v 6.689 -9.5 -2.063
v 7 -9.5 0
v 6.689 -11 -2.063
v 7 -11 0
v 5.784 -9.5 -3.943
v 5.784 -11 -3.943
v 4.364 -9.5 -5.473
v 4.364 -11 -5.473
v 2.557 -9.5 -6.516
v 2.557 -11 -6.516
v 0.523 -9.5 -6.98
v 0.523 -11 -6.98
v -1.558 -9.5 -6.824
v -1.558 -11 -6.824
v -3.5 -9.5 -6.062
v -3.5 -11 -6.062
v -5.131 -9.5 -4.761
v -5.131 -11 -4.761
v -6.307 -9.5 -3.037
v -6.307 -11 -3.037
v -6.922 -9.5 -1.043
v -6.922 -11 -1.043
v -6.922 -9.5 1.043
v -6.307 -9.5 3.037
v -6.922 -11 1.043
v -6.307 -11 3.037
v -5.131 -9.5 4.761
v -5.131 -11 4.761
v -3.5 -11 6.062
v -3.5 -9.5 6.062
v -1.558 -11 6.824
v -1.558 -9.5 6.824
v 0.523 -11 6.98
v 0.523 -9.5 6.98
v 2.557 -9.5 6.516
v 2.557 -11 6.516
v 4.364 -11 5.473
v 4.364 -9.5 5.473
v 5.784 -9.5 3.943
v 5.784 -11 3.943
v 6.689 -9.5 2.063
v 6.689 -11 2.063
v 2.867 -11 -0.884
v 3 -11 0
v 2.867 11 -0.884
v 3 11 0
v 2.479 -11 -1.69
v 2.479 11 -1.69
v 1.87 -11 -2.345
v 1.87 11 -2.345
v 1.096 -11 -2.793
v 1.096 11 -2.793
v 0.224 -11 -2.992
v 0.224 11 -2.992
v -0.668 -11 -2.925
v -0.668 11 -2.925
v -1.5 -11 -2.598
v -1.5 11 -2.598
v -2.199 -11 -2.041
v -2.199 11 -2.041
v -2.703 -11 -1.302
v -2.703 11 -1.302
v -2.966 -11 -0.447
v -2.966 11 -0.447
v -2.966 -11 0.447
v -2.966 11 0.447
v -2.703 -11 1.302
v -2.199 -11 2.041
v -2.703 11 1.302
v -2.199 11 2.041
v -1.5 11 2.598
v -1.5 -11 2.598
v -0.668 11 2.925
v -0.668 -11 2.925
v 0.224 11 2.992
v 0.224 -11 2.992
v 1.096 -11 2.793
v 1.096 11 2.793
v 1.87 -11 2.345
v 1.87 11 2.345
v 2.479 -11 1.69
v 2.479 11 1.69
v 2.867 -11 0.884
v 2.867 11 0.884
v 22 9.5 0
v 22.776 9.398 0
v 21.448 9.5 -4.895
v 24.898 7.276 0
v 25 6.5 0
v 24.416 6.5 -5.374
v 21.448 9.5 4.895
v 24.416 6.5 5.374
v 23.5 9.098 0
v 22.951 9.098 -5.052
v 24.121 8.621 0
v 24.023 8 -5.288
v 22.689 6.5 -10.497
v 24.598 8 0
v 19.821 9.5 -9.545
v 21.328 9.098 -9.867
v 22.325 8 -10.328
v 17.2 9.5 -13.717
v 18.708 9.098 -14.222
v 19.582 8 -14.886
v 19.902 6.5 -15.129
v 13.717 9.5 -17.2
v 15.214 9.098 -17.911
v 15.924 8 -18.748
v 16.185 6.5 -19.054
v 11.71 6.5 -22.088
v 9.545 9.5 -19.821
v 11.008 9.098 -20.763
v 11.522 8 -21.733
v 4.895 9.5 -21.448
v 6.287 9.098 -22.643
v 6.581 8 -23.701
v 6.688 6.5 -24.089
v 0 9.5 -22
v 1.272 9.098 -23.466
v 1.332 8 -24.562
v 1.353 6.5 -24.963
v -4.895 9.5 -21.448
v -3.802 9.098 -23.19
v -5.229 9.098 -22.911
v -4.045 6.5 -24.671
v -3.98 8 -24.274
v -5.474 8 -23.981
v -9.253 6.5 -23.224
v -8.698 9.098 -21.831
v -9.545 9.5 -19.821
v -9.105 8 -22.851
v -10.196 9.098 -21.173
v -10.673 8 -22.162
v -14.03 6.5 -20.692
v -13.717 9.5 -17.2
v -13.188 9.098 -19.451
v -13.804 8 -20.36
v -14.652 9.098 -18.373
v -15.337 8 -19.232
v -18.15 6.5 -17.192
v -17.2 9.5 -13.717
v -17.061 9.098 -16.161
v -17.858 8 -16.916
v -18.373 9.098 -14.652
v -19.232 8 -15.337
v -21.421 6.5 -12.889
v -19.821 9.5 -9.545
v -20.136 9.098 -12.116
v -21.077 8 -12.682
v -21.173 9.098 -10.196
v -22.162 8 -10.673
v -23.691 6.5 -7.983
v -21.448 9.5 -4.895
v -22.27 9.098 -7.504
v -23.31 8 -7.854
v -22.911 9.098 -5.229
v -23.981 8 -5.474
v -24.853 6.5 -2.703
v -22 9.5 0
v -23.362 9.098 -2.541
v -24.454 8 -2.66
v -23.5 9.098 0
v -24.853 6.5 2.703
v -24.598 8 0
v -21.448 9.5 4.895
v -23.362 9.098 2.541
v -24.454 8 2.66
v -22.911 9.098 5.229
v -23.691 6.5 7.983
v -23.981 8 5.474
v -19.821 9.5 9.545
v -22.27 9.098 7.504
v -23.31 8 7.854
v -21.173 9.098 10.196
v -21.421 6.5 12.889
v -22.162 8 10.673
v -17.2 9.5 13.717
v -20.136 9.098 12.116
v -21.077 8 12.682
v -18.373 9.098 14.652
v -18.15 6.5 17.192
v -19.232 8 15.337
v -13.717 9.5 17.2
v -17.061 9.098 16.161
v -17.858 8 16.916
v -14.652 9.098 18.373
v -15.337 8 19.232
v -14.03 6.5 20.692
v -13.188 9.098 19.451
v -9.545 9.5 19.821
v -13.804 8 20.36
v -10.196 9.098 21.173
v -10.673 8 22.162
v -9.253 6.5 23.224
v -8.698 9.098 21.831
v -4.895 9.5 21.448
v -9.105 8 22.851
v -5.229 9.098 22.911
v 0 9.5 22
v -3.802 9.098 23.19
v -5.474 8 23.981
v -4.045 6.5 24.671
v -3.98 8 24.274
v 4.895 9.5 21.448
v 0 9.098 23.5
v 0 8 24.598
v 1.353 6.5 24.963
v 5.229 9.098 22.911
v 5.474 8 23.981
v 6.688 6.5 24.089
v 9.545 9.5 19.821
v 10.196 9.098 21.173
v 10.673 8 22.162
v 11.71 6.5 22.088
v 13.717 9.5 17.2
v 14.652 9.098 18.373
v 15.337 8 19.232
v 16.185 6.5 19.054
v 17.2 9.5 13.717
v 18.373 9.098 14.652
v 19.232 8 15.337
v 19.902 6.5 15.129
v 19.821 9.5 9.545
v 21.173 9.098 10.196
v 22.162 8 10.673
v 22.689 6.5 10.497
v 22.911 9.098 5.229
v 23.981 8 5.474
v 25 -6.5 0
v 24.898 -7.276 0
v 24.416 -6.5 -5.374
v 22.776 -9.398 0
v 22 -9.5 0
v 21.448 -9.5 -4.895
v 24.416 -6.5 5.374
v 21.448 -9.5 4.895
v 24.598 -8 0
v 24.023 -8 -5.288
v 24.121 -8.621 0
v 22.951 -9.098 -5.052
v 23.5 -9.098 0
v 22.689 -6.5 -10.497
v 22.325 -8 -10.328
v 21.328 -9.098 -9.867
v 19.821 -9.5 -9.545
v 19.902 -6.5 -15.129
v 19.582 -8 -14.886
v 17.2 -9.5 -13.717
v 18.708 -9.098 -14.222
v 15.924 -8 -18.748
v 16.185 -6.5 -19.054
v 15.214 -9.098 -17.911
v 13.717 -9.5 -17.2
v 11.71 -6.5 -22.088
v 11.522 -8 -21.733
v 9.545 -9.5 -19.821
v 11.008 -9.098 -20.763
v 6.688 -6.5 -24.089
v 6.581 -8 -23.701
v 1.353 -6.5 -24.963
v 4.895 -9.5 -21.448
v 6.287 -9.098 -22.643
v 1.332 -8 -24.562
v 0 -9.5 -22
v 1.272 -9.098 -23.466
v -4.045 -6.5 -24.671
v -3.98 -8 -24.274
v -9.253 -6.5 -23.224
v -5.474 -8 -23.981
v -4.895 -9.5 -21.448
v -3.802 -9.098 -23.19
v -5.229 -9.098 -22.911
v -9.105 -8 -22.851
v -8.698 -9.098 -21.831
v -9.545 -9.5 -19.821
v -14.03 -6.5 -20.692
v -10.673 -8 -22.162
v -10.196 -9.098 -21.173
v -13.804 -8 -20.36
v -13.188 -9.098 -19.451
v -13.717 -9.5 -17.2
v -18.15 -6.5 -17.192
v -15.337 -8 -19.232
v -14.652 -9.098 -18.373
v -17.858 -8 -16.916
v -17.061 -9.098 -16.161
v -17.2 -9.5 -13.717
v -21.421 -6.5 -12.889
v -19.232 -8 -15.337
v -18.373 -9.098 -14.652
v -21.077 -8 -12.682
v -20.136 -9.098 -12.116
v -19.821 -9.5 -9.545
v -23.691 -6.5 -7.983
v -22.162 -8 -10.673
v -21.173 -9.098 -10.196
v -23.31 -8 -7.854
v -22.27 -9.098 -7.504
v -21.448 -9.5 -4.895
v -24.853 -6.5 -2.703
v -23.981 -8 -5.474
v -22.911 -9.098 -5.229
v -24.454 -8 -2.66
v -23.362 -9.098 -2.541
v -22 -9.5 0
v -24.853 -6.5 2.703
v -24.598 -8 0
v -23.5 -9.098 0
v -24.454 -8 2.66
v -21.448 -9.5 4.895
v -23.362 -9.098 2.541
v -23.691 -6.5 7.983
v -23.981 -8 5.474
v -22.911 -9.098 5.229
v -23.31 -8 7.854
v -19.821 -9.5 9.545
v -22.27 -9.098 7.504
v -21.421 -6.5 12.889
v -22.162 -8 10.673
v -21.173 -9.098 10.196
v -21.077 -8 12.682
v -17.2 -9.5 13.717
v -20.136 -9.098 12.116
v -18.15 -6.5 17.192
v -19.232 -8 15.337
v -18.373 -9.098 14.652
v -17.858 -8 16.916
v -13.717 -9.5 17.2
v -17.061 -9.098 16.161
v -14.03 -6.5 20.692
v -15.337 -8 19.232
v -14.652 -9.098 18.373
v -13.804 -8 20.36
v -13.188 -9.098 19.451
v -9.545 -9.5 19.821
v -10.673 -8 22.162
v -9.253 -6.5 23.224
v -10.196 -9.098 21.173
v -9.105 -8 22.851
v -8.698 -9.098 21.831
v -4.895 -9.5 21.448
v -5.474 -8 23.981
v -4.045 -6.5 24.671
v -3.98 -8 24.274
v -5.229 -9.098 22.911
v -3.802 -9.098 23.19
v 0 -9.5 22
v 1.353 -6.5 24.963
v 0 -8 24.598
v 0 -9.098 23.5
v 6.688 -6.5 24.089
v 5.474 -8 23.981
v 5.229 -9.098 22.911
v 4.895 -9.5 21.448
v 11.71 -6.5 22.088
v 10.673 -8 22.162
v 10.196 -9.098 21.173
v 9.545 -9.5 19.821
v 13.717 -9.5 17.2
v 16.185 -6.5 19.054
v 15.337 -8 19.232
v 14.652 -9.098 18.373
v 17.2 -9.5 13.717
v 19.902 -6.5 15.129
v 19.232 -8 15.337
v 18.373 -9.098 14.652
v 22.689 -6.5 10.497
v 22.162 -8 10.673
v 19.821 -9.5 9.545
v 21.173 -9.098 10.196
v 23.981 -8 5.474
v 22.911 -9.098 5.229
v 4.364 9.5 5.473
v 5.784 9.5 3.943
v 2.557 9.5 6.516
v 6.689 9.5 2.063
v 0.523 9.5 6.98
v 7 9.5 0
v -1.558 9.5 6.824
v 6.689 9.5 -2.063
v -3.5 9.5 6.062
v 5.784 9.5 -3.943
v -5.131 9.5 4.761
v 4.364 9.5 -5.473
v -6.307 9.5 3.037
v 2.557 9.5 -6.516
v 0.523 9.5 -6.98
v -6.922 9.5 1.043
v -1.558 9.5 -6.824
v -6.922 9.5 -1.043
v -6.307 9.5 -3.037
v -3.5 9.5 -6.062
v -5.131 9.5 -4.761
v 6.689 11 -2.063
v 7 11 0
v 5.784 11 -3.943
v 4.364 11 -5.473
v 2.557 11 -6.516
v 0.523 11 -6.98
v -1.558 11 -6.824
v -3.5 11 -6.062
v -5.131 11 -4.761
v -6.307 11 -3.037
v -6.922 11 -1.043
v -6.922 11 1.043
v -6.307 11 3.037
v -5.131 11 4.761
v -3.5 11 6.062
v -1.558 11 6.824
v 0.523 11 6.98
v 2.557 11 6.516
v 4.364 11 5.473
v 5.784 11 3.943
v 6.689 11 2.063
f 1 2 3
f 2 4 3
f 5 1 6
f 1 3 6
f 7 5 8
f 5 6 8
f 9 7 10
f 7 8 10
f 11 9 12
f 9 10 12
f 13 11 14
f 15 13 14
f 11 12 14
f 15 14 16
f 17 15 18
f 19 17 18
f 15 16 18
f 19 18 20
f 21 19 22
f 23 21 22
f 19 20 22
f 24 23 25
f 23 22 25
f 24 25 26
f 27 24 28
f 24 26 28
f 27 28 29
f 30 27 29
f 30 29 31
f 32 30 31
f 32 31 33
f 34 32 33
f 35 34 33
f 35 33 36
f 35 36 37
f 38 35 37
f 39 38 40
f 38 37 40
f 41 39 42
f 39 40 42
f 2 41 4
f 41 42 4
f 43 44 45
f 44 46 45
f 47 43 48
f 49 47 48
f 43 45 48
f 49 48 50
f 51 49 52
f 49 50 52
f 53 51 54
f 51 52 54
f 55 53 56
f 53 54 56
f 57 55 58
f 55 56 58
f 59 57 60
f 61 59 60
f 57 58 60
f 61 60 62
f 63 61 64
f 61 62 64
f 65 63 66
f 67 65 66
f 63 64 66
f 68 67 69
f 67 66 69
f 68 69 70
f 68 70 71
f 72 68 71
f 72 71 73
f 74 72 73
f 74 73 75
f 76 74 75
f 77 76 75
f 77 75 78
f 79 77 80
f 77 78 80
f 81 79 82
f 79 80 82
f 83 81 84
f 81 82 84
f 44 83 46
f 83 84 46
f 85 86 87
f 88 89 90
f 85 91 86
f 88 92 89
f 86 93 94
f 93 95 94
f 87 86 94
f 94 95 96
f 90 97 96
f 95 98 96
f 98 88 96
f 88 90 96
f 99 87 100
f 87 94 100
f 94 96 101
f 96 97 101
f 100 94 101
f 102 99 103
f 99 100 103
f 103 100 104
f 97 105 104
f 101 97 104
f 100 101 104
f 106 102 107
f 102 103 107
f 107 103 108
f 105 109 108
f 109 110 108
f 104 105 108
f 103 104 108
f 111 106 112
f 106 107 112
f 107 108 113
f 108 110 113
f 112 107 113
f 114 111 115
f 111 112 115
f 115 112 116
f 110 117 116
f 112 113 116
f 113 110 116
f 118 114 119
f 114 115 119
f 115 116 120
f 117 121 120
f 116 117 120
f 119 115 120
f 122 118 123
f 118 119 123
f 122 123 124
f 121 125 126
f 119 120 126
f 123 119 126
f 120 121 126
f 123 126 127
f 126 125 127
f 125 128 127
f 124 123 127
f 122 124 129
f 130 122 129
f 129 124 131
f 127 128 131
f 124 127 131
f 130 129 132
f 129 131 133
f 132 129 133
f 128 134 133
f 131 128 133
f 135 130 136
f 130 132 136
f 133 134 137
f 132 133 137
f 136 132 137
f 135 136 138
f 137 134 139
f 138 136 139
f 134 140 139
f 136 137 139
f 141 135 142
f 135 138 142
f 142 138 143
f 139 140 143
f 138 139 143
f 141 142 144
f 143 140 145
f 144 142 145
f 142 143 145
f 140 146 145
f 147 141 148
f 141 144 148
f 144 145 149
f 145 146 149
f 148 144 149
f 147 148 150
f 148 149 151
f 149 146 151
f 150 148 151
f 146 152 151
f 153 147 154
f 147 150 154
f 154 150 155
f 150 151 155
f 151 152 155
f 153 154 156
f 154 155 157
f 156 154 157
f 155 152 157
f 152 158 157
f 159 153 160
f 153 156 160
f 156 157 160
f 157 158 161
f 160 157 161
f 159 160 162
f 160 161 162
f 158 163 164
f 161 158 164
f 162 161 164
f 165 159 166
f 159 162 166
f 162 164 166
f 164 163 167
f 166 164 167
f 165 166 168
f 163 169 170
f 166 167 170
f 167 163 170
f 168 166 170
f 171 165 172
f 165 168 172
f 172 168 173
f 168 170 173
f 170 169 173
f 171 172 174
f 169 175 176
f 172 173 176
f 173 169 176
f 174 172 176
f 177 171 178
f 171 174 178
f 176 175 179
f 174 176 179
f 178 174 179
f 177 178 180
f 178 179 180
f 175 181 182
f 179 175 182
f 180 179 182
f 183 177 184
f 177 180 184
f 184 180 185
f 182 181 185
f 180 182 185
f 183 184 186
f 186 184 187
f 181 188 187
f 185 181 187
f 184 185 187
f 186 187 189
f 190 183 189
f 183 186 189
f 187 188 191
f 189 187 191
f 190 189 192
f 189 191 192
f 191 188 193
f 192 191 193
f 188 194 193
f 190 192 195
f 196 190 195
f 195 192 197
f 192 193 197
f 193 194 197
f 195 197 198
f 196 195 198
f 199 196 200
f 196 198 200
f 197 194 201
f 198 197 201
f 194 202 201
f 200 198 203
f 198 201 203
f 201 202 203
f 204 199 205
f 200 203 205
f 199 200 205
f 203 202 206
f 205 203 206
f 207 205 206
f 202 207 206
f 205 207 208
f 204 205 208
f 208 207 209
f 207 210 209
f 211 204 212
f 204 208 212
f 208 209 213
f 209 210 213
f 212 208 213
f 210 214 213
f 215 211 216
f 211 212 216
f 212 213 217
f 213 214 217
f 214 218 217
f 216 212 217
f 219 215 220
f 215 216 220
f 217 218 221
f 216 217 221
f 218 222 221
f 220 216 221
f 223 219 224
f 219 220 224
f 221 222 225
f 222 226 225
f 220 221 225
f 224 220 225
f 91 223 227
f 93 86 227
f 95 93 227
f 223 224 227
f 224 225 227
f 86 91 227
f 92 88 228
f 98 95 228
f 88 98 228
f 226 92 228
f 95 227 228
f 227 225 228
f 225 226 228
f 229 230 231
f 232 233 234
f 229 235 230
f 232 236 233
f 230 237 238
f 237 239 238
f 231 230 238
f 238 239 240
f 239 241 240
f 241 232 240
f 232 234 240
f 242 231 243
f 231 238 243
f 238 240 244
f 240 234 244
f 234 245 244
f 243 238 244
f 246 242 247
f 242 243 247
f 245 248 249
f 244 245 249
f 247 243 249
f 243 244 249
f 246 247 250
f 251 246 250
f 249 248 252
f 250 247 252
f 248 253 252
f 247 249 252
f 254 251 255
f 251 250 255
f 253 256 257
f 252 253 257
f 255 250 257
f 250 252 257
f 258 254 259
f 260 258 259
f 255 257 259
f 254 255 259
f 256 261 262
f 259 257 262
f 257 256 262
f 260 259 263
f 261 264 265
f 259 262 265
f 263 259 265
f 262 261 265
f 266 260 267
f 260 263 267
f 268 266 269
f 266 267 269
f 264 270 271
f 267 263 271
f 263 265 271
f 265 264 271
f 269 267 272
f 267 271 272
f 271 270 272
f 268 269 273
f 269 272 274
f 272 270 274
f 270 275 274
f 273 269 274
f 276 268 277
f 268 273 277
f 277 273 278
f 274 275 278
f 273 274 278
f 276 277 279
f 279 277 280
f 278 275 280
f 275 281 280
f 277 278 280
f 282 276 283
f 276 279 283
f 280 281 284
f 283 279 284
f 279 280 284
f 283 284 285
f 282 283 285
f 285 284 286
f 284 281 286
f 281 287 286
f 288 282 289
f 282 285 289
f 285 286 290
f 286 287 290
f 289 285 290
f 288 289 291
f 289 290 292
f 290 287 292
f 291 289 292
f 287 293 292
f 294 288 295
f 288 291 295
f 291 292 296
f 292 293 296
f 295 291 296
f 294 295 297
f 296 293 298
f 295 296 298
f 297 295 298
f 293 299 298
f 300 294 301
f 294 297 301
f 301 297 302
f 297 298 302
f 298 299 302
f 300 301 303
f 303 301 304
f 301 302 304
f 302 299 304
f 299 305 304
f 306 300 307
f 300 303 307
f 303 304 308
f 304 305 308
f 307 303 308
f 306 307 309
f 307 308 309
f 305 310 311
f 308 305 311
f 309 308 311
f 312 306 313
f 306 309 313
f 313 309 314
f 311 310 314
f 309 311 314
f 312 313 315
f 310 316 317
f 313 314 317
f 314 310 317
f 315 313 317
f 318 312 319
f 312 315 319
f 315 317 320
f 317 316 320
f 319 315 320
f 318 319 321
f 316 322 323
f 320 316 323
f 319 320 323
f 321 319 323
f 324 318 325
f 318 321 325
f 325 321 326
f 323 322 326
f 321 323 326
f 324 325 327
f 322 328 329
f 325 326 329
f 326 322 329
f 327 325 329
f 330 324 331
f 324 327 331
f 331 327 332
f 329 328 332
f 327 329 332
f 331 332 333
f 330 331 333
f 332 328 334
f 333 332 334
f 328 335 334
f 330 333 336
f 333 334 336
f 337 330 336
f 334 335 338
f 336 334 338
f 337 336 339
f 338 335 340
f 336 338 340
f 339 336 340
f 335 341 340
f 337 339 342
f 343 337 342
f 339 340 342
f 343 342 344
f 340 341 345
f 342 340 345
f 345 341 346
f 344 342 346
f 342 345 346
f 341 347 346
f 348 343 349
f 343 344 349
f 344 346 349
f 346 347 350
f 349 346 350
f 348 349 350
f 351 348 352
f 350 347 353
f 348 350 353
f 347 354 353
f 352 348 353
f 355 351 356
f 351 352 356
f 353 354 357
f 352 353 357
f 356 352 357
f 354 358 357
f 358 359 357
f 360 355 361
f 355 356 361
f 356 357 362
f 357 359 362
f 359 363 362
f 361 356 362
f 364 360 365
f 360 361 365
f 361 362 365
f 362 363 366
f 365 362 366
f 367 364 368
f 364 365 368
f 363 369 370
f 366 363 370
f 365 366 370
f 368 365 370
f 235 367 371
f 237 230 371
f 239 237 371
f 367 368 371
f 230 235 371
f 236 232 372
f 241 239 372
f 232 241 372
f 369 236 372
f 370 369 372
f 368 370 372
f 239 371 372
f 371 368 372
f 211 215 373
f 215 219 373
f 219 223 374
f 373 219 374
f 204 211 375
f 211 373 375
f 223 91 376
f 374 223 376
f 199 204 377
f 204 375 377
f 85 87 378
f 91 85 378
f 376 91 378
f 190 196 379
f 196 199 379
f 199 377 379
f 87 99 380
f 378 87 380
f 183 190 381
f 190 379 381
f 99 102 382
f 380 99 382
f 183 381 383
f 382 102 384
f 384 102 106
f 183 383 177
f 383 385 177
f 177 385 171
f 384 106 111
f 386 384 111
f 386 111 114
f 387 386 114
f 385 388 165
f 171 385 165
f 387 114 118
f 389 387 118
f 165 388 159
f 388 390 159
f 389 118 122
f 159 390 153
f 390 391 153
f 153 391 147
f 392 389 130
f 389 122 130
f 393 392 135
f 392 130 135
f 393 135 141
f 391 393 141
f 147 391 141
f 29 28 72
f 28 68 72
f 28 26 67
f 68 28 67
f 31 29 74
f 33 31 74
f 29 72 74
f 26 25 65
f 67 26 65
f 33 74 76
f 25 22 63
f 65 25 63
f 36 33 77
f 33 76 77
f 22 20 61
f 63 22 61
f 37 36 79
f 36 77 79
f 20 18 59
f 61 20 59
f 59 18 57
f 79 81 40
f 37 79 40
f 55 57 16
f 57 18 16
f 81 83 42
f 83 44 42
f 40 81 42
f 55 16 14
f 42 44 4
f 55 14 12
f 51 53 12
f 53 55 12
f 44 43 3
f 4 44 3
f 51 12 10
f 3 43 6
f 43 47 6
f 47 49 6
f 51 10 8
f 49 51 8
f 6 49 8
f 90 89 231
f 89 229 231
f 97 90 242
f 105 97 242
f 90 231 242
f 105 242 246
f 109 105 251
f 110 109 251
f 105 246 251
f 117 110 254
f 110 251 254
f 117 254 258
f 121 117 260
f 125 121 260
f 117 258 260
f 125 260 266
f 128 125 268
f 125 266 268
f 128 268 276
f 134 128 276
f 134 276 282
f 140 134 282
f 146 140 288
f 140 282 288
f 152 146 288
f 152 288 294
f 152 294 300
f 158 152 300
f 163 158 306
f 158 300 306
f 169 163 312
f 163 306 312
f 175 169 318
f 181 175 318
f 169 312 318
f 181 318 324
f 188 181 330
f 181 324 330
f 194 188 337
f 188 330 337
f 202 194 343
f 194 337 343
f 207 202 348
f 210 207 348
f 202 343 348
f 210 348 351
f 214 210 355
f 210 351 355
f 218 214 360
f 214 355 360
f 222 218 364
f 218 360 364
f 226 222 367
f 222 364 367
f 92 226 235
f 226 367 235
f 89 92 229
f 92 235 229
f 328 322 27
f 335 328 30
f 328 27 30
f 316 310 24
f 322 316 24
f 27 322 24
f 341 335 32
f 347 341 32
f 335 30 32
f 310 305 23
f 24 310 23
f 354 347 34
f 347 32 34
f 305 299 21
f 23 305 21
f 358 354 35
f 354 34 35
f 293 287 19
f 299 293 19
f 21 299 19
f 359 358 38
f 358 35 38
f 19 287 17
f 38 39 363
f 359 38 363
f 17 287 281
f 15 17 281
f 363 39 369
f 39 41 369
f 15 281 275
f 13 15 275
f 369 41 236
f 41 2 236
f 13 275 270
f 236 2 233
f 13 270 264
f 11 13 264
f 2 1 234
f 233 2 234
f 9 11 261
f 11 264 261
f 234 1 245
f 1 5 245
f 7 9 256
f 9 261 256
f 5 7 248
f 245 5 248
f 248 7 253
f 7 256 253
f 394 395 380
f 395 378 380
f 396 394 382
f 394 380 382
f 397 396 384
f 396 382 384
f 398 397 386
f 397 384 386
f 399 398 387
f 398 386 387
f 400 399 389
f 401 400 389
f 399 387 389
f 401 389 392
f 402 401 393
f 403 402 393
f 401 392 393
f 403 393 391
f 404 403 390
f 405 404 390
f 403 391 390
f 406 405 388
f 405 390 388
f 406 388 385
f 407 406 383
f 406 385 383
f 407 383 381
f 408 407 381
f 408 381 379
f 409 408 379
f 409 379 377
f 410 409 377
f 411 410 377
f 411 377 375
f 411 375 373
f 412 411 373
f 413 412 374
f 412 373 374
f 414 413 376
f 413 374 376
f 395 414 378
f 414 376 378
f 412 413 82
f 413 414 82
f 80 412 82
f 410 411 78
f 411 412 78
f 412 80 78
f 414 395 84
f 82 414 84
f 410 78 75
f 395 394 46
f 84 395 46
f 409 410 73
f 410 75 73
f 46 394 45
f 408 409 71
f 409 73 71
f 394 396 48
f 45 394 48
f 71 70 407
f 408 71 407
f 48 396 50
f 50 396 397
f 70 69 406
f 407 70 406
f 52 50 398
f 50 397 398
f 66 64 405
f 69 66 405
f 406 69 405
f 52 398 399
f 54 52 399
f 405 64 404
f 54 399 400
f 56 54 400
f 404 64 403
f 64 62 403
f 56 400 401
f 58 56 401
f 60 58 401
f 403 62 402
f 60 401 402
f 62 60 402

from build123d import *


with BuildPart() as part:
    # Sketch2 → Revolve2 (revolve)
    with BuildSketch(Plane.XY):
        with BuildLine():
            Line((3, -11), (3, 11))
            Line((3, 11), (7, 11))
            Line((7, 11), (7, 9.5))
            Line((7, 9.5), (22, 9.5))
            ThreePointArc((22, 9.5), (24.121320344, 8.621320344), (25, 6.5))
            Line((25, 6.5), (25, -6.5))
            ThreePointArc((25, -6.5), (24.121320344, -8.621320344), (22, -9.5))
            Line((22, -9.5), (7, -9.5))
            Line((7, -9.5), (7, -11))
            Line((7, -11), (3, -11))
        make_face()
    revolve(axis=Axis((0, 0, 0), (0, 1, 0)))


solid = part.part
